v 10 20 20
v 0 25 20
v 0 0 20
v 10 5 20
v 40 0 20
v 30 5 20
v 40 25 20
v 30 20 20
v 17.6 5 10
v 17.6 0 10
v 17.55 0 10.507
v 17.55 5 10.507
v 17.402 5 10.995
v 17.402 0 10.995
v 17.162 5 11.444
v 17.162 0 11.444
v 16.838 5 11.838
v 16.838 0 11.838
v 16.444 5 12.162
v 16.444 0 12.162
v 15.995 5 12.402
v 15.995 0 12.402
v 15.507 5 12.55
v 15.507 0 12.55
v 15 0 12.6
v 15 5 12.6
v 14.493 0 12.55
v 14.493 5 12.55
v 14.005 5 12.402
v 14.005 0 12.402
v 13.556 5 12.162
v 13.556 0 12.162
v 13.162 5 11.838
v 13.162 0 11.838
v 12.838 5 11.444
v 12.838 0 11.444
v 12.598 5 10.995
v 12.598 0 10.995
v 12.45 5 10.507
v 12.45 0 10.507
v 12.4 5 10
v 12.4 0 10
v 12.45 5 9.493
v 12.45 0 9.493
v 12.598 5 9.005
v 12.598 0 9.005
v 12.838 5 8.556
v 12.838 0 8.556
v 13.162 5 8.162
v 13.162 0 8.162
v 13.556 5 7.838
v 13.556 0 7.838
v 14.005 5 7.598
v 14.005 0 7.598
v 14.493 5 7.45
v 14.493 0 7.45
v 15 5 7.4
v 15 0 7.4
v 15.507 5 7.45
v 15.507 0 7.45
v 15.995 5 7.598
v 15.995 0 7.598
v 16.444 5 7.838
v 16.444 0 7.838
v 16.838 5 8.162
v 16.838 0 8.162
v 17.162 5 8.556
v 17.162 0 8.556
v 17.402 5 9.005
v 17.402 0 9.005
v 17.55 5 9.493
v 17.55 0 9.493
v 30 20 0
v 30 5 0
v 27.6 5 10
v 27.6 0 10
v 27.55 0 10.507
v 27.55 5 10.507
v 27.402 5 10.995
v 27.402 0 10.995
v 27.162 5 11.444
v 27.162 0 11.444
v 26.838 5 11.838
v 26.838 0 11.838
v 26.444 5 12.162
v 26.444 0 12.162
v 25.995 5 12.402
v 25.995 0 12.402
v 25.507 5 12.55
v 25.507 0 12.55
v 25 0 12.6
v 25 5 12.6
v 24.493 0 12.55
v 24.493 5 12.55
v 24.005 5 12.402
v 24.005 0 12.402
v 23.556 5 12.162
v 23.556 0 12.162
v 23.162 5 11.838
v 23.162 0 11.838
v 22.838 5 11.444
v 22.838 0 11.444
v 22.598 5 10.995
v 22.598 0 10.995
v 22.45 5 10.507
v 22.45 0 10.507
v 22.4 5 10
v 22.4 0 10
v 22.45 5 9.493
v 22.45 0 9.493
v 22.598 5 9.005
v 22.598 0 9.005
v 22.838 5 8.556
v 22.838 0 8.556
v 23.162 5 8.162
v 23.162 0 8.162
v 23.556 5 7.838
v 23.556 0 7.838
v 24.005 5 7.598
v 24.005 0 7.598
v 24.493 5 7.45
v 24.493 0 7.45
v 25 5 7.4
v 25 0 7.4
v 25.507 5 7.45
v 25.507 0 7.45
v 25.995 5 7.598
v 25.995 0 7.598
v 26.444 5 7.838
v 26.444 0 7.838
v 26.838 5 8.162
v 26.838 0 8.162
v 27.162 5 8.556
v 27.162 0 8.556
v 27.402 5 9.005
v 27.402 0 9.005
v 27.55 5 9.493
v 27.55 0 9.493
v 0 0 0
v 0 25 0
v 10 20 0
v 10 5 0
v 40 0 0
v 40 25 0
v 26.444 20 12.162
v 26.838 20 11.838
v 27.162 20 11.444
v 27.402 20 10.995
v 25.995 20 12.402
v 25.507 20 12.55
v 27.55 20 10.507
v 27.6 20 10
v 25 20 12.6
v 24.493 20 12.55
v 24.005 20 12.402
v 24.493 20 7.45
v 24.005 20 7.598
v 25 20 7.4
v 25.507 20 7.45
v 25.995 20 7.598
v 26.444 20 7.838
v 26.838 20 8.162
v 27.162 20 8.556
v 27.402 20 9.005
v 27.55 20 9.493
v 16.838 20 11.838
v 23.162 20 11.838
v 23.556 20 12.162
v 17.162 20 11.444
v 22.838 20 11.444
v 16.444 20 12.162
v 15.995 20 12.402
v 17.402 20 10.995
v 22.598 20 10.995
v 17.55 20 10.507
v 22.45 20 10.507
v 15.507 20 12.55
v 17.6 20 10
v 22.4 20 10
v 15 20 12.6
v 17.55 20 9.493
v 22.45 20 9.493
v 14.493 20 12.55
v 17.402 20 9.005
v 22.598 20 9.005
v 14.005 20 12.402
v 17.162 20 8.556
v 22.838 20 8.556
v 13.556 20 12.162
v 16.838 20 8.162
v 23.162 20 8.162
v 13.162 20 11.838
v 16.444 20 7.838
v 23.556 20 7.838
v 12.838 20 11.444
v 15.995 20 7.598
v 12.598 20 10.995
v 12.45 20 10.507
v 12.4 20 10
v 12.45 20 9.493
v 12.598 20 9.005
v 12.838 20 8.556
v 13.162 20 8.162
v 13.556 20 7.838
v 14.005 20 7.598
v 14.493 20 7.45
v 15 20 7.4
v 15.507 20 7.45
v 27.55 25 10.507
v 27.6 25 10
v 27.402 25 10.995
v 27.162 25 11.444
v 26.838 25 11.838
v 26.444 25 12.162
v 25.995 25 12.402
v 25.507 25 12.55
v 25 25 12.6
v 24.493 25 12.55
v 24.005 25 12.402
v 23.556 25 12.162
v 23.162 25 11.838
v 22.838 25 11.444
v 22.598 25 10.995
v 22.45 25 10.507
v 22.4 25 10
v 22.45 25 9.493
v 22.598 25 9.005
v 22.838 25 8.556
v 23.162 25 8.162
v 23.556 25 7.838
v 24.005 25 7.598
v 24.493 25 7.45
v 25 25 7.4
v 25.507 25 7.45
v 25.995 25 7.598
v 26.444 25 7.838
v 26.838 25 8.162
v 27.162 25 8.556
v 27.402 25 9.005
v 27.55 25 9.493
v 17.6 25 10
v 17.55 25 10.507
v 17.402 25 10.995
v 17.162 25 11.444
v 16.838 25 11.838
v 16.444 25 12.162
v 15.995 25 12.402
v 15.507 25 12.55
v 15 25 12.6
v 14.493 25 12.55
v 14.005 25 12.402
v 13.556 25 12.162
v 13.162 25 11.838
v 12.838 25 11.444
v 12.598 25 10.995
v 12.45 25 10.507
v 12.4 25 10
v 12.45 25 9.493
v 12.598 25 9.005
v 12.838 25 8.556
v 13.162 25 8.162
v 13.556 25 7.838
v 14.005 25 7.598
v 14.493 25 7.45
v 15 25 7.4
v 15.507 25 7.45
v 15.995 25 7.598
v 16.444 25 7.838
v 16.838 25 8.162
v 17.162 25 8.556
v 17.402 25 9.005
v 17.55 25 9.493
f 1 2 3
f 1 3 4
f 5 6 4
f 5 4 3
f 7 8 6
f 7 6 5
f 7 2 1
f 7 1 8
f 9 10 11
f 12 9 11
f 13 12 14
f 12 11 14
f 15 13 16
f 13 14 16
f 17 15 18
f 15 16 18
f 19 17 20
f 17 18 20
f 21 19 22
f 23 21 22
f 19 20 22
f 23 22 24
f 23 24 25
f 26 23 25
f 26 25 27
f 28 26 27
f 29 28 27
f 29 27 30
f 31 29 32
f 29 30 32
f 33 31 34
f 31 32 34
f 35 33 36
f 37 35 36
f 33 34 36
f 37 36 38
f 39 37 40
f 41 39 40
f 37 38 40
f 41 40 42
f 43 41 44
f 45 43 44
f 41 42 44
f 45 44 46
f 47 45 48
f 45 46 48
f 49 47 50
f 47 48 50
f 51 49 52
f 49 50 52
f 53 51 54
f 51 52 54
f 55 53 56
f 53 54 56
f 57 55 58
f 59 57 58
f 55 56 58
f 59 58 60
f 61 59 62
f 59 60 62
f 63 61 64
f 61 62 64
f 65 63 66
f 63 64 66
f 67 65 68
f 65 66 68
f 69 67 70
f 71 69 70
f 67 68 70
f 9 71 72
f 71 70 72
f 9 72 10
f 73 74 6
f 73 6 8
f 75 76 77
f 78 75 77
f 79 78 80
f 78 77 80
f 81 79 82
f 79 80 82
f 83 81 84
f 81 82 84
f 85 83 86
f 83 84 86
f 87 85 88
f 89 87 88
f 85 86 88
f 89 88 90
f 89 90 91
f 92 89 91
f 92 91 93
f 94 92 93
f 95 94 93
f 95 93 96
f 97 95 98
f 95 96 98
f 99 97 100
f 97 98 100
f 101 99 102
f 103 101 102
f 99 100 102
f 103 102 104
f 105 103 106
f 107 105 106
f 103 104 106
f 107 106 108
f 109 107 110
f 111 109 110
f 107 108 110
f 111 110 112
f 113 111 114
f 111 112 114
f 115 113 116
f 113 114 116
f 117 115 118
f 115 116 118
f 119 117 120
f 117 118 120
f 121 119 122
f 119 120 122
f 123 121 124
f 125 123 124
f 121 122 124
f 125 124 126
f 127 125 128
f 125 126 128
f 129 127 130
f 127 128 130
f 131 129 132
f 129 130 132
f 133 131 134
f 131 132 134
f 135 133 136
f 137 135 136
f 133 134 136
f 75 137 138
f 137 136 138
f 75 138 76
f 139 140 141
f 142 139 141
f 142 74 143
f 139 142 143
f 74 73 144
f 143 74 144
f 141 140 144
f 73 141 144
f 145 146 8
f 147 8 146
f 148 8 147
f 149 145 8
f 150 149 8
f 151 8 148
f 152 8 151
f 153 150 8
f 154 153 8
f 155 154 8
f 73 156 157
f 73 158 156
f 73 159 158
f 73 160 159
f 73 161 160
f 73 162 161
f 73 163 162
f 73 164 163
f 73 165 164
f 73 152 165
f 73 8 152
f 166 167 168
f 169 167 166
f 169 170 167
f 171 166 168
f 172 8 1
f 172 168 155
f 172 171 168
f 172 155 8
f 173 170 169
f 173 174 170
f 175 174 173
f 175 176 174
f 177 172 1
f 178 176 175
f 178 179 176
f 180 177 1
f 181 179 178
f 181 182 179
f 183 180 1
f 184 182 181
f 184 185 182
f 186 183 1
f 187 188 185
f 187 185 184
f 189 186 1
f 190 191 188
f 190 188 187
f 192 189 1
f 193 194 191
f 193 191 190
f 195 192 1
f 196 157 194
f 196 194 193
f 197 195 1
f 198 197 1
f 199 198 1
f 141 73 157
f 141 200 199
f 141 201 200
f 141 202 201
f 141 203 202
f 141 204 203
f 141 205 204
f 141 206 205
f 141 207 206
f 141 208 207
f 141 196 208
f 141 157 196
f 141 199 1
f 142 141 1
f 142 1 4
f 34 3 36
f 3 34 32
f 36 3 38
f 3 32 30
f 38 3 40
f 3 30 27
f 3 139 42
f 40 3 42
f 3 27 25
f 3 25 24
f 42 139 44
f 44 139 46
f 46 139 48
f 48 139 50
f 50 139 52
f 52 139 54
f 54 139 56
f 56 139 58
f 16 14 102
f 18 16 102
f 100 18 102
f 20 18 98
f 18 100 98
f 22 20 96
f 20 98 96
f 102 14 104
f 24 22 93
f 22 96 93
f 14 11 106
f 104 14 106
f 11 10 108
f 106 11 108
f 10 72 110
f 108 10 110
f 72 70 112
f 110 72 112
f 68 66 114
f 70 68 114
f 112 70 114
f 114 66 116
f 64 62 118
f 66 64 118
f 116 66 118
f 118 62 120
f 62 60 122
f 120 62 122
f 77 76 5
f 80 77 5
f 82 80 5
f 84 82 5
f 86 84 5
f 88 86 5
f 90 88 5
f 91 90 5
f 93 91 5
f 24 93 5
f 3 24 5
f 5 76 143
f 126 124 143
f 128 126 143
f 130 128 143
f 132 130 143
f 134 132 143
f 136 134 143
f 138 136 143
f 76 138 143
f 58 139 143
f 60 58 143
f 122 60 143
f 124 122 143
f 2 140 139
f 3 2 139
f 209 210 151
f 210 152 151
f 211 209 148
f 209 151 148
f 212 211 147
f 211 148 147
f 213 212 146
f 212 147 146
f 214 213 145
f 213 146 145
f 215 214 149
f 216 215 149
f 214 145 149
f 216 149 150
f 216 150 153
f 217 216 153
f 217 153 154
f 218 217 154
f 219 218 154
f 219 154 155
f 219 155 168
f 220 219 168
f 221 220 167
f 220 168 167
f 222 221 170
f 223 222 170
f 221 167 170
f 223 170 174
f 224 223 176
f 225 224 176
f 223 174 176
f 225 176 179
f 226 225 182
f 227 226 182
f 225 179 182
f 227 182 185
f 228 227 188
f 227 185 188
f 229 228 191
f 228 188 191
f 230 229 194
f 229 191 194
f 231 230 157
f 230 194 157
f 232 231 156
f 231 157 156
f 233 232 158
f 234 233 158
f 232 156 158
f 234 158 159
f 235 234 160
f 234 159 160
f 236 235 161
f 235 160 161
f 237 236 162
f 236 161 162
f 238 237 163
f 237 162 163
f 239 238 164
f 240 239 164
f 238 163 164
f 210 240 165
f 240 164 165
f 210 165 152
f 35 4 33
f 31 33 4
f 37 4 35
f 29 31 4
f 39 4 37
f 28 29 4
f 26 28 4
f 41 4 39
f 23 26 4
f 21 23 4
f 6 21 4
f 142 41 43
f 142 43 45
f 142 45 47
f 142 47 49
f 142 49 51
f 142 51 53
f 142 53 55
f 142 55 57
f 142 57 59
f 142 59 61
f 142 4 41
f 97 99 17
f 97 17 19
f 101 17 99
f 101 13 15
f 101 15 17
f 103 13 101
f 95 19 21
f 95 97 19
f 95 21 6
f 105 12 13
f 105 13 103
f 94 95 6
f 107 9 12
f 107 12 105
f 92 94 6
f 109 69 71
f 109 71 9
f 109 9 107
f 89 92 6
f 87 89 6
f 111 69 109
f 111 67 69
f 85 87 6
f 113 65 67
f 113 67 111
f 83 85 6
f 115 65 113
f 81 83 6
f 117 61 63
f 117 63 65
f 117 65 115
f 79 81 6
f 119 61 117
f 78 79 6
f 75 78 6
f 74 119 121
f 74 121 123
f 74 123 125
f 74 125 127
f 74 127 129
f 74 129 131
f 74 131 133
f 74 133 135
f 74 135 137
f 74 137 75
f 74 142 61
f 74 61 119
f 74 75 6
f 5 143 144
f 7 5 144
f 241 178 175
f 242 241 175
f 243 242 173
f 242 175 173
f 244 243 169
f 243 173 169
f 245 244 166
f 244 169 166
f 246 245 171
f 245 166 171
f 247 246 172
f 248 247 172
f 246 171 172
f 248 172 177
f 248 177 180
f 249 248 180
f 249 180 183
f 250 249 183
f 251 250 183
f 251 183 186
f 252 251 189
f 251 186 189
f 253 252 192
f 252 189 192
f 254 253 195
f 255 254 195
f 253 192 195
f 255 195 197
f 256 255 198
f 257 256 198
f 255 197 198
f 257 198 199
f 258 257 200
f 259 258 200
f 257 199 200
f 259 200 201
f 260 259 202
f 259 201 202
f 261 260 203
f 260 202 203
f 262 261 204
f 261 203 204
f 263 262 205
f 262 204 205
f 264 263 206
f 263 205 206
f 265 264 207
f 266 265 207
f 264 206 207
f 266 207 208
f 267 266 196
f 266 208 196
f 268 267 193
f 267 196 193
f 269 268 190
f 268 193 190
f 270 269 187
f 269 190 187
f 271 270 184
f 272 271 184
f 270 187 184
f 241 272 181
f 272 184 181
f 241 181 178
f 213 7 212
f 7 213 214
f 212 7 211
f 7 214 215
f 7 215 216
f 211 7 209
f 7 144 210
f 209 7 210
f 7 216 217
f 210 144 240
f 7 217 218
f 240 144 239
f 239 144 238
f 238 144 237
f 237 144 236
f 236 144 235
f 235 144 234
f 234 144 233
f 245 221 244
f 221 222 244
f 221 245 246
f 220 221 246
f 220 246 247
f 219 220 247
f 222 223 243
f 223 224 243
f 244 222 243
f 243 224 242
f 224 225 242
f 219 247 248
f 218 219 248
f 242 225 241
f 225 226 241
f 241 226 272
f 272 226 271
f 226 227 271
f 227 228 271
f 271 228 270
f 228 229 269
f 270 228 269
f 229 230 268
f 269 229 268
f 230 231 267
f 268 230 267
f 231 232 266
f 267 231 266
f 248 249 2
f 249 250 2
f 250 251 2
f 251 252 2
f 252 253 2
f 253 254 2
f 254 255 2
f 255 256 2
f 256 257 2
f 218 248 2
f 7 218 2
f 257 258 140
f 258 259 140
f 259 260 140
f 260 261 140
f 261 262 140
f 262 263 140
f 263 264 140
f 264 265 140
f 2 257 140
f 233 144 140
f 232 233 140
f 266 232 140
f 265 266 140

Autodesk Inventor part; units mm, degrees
ref_plane "YZ Plane" through (0, 0, 0) normal (1, 0, 0) x (0, 1, 0)
ref_plane "XZ Plane" through (0, 0, 0) normal (0, 1, 0) x (-1, 0, 0)
sketch "스케치1" plane through (0, 0, 0) normal (0, 0, 1) x (1, 0, 0)
  line L0 (0, 0) -> (40, 0)
  line L1 (40, 0) -> (40, 25)
  line L2 (40, 25) -> (0, 25)
  line L3 (0, 25) -> (0, 0)
  line L4 (10, 5) -> (30, 5)
  line L5 (30, 5) -> (30, 20)
  line L6 (30, 20) -> (10, 20)
  line L7 (10, 20) -> (10, 5)
  point P0 (20, 20)
  point P1 (20, 25)
  point P2 (10, 12.5)
  point P3 (0, 12.5)
  dimension "d0" = 25
  dimension "d1" = 40
  dimension "d4" = 5
  dimension "d5" = 10
extrude "돌출1" add sketch "스케치1" along normal blind 20 contours L3 L2 L1 L0 | L7 L6 L5 L4
extrude "돌출2" cut sketch "스케치1" along normal blind 20 contours L7 L6 L5 L4
sketch "스케치2" plane through (0, 0, 0) normal (0, -1, 0) x (1, 0, 0)
  line L0 (10, 0) -> (10, 20) projected
  line L1 (0, 0) -> (40, 0) projected
  line L2 (40, 0) -> (40, 20) projected
  line L3 (0, 20) -> (40, 20) projected
  line L4 (0, 0) -> (0, 20) projected
  line L5 (30, 0) -> (30, 20) projected
  circle A0 centre (15, 10) radius 2.6
  circle A1 centre (25, 10) radius 2.6
  point P0 (10, 10)
  point P1 (20, 20)
  dimension "d11" = 5.2
  dimension "d12" = 5.2
  dimension "d13" = 10
  dimension "d14" = 5
extrude "돌출3" cut sketch "스케치2" against normal through all contours A0 | A1
ref_plane "작업 평면1" through (0, 12.5, 0) normal (0, -1, 0) x (1, 0, 0)
properties part number "다리 연결 부품-3"
